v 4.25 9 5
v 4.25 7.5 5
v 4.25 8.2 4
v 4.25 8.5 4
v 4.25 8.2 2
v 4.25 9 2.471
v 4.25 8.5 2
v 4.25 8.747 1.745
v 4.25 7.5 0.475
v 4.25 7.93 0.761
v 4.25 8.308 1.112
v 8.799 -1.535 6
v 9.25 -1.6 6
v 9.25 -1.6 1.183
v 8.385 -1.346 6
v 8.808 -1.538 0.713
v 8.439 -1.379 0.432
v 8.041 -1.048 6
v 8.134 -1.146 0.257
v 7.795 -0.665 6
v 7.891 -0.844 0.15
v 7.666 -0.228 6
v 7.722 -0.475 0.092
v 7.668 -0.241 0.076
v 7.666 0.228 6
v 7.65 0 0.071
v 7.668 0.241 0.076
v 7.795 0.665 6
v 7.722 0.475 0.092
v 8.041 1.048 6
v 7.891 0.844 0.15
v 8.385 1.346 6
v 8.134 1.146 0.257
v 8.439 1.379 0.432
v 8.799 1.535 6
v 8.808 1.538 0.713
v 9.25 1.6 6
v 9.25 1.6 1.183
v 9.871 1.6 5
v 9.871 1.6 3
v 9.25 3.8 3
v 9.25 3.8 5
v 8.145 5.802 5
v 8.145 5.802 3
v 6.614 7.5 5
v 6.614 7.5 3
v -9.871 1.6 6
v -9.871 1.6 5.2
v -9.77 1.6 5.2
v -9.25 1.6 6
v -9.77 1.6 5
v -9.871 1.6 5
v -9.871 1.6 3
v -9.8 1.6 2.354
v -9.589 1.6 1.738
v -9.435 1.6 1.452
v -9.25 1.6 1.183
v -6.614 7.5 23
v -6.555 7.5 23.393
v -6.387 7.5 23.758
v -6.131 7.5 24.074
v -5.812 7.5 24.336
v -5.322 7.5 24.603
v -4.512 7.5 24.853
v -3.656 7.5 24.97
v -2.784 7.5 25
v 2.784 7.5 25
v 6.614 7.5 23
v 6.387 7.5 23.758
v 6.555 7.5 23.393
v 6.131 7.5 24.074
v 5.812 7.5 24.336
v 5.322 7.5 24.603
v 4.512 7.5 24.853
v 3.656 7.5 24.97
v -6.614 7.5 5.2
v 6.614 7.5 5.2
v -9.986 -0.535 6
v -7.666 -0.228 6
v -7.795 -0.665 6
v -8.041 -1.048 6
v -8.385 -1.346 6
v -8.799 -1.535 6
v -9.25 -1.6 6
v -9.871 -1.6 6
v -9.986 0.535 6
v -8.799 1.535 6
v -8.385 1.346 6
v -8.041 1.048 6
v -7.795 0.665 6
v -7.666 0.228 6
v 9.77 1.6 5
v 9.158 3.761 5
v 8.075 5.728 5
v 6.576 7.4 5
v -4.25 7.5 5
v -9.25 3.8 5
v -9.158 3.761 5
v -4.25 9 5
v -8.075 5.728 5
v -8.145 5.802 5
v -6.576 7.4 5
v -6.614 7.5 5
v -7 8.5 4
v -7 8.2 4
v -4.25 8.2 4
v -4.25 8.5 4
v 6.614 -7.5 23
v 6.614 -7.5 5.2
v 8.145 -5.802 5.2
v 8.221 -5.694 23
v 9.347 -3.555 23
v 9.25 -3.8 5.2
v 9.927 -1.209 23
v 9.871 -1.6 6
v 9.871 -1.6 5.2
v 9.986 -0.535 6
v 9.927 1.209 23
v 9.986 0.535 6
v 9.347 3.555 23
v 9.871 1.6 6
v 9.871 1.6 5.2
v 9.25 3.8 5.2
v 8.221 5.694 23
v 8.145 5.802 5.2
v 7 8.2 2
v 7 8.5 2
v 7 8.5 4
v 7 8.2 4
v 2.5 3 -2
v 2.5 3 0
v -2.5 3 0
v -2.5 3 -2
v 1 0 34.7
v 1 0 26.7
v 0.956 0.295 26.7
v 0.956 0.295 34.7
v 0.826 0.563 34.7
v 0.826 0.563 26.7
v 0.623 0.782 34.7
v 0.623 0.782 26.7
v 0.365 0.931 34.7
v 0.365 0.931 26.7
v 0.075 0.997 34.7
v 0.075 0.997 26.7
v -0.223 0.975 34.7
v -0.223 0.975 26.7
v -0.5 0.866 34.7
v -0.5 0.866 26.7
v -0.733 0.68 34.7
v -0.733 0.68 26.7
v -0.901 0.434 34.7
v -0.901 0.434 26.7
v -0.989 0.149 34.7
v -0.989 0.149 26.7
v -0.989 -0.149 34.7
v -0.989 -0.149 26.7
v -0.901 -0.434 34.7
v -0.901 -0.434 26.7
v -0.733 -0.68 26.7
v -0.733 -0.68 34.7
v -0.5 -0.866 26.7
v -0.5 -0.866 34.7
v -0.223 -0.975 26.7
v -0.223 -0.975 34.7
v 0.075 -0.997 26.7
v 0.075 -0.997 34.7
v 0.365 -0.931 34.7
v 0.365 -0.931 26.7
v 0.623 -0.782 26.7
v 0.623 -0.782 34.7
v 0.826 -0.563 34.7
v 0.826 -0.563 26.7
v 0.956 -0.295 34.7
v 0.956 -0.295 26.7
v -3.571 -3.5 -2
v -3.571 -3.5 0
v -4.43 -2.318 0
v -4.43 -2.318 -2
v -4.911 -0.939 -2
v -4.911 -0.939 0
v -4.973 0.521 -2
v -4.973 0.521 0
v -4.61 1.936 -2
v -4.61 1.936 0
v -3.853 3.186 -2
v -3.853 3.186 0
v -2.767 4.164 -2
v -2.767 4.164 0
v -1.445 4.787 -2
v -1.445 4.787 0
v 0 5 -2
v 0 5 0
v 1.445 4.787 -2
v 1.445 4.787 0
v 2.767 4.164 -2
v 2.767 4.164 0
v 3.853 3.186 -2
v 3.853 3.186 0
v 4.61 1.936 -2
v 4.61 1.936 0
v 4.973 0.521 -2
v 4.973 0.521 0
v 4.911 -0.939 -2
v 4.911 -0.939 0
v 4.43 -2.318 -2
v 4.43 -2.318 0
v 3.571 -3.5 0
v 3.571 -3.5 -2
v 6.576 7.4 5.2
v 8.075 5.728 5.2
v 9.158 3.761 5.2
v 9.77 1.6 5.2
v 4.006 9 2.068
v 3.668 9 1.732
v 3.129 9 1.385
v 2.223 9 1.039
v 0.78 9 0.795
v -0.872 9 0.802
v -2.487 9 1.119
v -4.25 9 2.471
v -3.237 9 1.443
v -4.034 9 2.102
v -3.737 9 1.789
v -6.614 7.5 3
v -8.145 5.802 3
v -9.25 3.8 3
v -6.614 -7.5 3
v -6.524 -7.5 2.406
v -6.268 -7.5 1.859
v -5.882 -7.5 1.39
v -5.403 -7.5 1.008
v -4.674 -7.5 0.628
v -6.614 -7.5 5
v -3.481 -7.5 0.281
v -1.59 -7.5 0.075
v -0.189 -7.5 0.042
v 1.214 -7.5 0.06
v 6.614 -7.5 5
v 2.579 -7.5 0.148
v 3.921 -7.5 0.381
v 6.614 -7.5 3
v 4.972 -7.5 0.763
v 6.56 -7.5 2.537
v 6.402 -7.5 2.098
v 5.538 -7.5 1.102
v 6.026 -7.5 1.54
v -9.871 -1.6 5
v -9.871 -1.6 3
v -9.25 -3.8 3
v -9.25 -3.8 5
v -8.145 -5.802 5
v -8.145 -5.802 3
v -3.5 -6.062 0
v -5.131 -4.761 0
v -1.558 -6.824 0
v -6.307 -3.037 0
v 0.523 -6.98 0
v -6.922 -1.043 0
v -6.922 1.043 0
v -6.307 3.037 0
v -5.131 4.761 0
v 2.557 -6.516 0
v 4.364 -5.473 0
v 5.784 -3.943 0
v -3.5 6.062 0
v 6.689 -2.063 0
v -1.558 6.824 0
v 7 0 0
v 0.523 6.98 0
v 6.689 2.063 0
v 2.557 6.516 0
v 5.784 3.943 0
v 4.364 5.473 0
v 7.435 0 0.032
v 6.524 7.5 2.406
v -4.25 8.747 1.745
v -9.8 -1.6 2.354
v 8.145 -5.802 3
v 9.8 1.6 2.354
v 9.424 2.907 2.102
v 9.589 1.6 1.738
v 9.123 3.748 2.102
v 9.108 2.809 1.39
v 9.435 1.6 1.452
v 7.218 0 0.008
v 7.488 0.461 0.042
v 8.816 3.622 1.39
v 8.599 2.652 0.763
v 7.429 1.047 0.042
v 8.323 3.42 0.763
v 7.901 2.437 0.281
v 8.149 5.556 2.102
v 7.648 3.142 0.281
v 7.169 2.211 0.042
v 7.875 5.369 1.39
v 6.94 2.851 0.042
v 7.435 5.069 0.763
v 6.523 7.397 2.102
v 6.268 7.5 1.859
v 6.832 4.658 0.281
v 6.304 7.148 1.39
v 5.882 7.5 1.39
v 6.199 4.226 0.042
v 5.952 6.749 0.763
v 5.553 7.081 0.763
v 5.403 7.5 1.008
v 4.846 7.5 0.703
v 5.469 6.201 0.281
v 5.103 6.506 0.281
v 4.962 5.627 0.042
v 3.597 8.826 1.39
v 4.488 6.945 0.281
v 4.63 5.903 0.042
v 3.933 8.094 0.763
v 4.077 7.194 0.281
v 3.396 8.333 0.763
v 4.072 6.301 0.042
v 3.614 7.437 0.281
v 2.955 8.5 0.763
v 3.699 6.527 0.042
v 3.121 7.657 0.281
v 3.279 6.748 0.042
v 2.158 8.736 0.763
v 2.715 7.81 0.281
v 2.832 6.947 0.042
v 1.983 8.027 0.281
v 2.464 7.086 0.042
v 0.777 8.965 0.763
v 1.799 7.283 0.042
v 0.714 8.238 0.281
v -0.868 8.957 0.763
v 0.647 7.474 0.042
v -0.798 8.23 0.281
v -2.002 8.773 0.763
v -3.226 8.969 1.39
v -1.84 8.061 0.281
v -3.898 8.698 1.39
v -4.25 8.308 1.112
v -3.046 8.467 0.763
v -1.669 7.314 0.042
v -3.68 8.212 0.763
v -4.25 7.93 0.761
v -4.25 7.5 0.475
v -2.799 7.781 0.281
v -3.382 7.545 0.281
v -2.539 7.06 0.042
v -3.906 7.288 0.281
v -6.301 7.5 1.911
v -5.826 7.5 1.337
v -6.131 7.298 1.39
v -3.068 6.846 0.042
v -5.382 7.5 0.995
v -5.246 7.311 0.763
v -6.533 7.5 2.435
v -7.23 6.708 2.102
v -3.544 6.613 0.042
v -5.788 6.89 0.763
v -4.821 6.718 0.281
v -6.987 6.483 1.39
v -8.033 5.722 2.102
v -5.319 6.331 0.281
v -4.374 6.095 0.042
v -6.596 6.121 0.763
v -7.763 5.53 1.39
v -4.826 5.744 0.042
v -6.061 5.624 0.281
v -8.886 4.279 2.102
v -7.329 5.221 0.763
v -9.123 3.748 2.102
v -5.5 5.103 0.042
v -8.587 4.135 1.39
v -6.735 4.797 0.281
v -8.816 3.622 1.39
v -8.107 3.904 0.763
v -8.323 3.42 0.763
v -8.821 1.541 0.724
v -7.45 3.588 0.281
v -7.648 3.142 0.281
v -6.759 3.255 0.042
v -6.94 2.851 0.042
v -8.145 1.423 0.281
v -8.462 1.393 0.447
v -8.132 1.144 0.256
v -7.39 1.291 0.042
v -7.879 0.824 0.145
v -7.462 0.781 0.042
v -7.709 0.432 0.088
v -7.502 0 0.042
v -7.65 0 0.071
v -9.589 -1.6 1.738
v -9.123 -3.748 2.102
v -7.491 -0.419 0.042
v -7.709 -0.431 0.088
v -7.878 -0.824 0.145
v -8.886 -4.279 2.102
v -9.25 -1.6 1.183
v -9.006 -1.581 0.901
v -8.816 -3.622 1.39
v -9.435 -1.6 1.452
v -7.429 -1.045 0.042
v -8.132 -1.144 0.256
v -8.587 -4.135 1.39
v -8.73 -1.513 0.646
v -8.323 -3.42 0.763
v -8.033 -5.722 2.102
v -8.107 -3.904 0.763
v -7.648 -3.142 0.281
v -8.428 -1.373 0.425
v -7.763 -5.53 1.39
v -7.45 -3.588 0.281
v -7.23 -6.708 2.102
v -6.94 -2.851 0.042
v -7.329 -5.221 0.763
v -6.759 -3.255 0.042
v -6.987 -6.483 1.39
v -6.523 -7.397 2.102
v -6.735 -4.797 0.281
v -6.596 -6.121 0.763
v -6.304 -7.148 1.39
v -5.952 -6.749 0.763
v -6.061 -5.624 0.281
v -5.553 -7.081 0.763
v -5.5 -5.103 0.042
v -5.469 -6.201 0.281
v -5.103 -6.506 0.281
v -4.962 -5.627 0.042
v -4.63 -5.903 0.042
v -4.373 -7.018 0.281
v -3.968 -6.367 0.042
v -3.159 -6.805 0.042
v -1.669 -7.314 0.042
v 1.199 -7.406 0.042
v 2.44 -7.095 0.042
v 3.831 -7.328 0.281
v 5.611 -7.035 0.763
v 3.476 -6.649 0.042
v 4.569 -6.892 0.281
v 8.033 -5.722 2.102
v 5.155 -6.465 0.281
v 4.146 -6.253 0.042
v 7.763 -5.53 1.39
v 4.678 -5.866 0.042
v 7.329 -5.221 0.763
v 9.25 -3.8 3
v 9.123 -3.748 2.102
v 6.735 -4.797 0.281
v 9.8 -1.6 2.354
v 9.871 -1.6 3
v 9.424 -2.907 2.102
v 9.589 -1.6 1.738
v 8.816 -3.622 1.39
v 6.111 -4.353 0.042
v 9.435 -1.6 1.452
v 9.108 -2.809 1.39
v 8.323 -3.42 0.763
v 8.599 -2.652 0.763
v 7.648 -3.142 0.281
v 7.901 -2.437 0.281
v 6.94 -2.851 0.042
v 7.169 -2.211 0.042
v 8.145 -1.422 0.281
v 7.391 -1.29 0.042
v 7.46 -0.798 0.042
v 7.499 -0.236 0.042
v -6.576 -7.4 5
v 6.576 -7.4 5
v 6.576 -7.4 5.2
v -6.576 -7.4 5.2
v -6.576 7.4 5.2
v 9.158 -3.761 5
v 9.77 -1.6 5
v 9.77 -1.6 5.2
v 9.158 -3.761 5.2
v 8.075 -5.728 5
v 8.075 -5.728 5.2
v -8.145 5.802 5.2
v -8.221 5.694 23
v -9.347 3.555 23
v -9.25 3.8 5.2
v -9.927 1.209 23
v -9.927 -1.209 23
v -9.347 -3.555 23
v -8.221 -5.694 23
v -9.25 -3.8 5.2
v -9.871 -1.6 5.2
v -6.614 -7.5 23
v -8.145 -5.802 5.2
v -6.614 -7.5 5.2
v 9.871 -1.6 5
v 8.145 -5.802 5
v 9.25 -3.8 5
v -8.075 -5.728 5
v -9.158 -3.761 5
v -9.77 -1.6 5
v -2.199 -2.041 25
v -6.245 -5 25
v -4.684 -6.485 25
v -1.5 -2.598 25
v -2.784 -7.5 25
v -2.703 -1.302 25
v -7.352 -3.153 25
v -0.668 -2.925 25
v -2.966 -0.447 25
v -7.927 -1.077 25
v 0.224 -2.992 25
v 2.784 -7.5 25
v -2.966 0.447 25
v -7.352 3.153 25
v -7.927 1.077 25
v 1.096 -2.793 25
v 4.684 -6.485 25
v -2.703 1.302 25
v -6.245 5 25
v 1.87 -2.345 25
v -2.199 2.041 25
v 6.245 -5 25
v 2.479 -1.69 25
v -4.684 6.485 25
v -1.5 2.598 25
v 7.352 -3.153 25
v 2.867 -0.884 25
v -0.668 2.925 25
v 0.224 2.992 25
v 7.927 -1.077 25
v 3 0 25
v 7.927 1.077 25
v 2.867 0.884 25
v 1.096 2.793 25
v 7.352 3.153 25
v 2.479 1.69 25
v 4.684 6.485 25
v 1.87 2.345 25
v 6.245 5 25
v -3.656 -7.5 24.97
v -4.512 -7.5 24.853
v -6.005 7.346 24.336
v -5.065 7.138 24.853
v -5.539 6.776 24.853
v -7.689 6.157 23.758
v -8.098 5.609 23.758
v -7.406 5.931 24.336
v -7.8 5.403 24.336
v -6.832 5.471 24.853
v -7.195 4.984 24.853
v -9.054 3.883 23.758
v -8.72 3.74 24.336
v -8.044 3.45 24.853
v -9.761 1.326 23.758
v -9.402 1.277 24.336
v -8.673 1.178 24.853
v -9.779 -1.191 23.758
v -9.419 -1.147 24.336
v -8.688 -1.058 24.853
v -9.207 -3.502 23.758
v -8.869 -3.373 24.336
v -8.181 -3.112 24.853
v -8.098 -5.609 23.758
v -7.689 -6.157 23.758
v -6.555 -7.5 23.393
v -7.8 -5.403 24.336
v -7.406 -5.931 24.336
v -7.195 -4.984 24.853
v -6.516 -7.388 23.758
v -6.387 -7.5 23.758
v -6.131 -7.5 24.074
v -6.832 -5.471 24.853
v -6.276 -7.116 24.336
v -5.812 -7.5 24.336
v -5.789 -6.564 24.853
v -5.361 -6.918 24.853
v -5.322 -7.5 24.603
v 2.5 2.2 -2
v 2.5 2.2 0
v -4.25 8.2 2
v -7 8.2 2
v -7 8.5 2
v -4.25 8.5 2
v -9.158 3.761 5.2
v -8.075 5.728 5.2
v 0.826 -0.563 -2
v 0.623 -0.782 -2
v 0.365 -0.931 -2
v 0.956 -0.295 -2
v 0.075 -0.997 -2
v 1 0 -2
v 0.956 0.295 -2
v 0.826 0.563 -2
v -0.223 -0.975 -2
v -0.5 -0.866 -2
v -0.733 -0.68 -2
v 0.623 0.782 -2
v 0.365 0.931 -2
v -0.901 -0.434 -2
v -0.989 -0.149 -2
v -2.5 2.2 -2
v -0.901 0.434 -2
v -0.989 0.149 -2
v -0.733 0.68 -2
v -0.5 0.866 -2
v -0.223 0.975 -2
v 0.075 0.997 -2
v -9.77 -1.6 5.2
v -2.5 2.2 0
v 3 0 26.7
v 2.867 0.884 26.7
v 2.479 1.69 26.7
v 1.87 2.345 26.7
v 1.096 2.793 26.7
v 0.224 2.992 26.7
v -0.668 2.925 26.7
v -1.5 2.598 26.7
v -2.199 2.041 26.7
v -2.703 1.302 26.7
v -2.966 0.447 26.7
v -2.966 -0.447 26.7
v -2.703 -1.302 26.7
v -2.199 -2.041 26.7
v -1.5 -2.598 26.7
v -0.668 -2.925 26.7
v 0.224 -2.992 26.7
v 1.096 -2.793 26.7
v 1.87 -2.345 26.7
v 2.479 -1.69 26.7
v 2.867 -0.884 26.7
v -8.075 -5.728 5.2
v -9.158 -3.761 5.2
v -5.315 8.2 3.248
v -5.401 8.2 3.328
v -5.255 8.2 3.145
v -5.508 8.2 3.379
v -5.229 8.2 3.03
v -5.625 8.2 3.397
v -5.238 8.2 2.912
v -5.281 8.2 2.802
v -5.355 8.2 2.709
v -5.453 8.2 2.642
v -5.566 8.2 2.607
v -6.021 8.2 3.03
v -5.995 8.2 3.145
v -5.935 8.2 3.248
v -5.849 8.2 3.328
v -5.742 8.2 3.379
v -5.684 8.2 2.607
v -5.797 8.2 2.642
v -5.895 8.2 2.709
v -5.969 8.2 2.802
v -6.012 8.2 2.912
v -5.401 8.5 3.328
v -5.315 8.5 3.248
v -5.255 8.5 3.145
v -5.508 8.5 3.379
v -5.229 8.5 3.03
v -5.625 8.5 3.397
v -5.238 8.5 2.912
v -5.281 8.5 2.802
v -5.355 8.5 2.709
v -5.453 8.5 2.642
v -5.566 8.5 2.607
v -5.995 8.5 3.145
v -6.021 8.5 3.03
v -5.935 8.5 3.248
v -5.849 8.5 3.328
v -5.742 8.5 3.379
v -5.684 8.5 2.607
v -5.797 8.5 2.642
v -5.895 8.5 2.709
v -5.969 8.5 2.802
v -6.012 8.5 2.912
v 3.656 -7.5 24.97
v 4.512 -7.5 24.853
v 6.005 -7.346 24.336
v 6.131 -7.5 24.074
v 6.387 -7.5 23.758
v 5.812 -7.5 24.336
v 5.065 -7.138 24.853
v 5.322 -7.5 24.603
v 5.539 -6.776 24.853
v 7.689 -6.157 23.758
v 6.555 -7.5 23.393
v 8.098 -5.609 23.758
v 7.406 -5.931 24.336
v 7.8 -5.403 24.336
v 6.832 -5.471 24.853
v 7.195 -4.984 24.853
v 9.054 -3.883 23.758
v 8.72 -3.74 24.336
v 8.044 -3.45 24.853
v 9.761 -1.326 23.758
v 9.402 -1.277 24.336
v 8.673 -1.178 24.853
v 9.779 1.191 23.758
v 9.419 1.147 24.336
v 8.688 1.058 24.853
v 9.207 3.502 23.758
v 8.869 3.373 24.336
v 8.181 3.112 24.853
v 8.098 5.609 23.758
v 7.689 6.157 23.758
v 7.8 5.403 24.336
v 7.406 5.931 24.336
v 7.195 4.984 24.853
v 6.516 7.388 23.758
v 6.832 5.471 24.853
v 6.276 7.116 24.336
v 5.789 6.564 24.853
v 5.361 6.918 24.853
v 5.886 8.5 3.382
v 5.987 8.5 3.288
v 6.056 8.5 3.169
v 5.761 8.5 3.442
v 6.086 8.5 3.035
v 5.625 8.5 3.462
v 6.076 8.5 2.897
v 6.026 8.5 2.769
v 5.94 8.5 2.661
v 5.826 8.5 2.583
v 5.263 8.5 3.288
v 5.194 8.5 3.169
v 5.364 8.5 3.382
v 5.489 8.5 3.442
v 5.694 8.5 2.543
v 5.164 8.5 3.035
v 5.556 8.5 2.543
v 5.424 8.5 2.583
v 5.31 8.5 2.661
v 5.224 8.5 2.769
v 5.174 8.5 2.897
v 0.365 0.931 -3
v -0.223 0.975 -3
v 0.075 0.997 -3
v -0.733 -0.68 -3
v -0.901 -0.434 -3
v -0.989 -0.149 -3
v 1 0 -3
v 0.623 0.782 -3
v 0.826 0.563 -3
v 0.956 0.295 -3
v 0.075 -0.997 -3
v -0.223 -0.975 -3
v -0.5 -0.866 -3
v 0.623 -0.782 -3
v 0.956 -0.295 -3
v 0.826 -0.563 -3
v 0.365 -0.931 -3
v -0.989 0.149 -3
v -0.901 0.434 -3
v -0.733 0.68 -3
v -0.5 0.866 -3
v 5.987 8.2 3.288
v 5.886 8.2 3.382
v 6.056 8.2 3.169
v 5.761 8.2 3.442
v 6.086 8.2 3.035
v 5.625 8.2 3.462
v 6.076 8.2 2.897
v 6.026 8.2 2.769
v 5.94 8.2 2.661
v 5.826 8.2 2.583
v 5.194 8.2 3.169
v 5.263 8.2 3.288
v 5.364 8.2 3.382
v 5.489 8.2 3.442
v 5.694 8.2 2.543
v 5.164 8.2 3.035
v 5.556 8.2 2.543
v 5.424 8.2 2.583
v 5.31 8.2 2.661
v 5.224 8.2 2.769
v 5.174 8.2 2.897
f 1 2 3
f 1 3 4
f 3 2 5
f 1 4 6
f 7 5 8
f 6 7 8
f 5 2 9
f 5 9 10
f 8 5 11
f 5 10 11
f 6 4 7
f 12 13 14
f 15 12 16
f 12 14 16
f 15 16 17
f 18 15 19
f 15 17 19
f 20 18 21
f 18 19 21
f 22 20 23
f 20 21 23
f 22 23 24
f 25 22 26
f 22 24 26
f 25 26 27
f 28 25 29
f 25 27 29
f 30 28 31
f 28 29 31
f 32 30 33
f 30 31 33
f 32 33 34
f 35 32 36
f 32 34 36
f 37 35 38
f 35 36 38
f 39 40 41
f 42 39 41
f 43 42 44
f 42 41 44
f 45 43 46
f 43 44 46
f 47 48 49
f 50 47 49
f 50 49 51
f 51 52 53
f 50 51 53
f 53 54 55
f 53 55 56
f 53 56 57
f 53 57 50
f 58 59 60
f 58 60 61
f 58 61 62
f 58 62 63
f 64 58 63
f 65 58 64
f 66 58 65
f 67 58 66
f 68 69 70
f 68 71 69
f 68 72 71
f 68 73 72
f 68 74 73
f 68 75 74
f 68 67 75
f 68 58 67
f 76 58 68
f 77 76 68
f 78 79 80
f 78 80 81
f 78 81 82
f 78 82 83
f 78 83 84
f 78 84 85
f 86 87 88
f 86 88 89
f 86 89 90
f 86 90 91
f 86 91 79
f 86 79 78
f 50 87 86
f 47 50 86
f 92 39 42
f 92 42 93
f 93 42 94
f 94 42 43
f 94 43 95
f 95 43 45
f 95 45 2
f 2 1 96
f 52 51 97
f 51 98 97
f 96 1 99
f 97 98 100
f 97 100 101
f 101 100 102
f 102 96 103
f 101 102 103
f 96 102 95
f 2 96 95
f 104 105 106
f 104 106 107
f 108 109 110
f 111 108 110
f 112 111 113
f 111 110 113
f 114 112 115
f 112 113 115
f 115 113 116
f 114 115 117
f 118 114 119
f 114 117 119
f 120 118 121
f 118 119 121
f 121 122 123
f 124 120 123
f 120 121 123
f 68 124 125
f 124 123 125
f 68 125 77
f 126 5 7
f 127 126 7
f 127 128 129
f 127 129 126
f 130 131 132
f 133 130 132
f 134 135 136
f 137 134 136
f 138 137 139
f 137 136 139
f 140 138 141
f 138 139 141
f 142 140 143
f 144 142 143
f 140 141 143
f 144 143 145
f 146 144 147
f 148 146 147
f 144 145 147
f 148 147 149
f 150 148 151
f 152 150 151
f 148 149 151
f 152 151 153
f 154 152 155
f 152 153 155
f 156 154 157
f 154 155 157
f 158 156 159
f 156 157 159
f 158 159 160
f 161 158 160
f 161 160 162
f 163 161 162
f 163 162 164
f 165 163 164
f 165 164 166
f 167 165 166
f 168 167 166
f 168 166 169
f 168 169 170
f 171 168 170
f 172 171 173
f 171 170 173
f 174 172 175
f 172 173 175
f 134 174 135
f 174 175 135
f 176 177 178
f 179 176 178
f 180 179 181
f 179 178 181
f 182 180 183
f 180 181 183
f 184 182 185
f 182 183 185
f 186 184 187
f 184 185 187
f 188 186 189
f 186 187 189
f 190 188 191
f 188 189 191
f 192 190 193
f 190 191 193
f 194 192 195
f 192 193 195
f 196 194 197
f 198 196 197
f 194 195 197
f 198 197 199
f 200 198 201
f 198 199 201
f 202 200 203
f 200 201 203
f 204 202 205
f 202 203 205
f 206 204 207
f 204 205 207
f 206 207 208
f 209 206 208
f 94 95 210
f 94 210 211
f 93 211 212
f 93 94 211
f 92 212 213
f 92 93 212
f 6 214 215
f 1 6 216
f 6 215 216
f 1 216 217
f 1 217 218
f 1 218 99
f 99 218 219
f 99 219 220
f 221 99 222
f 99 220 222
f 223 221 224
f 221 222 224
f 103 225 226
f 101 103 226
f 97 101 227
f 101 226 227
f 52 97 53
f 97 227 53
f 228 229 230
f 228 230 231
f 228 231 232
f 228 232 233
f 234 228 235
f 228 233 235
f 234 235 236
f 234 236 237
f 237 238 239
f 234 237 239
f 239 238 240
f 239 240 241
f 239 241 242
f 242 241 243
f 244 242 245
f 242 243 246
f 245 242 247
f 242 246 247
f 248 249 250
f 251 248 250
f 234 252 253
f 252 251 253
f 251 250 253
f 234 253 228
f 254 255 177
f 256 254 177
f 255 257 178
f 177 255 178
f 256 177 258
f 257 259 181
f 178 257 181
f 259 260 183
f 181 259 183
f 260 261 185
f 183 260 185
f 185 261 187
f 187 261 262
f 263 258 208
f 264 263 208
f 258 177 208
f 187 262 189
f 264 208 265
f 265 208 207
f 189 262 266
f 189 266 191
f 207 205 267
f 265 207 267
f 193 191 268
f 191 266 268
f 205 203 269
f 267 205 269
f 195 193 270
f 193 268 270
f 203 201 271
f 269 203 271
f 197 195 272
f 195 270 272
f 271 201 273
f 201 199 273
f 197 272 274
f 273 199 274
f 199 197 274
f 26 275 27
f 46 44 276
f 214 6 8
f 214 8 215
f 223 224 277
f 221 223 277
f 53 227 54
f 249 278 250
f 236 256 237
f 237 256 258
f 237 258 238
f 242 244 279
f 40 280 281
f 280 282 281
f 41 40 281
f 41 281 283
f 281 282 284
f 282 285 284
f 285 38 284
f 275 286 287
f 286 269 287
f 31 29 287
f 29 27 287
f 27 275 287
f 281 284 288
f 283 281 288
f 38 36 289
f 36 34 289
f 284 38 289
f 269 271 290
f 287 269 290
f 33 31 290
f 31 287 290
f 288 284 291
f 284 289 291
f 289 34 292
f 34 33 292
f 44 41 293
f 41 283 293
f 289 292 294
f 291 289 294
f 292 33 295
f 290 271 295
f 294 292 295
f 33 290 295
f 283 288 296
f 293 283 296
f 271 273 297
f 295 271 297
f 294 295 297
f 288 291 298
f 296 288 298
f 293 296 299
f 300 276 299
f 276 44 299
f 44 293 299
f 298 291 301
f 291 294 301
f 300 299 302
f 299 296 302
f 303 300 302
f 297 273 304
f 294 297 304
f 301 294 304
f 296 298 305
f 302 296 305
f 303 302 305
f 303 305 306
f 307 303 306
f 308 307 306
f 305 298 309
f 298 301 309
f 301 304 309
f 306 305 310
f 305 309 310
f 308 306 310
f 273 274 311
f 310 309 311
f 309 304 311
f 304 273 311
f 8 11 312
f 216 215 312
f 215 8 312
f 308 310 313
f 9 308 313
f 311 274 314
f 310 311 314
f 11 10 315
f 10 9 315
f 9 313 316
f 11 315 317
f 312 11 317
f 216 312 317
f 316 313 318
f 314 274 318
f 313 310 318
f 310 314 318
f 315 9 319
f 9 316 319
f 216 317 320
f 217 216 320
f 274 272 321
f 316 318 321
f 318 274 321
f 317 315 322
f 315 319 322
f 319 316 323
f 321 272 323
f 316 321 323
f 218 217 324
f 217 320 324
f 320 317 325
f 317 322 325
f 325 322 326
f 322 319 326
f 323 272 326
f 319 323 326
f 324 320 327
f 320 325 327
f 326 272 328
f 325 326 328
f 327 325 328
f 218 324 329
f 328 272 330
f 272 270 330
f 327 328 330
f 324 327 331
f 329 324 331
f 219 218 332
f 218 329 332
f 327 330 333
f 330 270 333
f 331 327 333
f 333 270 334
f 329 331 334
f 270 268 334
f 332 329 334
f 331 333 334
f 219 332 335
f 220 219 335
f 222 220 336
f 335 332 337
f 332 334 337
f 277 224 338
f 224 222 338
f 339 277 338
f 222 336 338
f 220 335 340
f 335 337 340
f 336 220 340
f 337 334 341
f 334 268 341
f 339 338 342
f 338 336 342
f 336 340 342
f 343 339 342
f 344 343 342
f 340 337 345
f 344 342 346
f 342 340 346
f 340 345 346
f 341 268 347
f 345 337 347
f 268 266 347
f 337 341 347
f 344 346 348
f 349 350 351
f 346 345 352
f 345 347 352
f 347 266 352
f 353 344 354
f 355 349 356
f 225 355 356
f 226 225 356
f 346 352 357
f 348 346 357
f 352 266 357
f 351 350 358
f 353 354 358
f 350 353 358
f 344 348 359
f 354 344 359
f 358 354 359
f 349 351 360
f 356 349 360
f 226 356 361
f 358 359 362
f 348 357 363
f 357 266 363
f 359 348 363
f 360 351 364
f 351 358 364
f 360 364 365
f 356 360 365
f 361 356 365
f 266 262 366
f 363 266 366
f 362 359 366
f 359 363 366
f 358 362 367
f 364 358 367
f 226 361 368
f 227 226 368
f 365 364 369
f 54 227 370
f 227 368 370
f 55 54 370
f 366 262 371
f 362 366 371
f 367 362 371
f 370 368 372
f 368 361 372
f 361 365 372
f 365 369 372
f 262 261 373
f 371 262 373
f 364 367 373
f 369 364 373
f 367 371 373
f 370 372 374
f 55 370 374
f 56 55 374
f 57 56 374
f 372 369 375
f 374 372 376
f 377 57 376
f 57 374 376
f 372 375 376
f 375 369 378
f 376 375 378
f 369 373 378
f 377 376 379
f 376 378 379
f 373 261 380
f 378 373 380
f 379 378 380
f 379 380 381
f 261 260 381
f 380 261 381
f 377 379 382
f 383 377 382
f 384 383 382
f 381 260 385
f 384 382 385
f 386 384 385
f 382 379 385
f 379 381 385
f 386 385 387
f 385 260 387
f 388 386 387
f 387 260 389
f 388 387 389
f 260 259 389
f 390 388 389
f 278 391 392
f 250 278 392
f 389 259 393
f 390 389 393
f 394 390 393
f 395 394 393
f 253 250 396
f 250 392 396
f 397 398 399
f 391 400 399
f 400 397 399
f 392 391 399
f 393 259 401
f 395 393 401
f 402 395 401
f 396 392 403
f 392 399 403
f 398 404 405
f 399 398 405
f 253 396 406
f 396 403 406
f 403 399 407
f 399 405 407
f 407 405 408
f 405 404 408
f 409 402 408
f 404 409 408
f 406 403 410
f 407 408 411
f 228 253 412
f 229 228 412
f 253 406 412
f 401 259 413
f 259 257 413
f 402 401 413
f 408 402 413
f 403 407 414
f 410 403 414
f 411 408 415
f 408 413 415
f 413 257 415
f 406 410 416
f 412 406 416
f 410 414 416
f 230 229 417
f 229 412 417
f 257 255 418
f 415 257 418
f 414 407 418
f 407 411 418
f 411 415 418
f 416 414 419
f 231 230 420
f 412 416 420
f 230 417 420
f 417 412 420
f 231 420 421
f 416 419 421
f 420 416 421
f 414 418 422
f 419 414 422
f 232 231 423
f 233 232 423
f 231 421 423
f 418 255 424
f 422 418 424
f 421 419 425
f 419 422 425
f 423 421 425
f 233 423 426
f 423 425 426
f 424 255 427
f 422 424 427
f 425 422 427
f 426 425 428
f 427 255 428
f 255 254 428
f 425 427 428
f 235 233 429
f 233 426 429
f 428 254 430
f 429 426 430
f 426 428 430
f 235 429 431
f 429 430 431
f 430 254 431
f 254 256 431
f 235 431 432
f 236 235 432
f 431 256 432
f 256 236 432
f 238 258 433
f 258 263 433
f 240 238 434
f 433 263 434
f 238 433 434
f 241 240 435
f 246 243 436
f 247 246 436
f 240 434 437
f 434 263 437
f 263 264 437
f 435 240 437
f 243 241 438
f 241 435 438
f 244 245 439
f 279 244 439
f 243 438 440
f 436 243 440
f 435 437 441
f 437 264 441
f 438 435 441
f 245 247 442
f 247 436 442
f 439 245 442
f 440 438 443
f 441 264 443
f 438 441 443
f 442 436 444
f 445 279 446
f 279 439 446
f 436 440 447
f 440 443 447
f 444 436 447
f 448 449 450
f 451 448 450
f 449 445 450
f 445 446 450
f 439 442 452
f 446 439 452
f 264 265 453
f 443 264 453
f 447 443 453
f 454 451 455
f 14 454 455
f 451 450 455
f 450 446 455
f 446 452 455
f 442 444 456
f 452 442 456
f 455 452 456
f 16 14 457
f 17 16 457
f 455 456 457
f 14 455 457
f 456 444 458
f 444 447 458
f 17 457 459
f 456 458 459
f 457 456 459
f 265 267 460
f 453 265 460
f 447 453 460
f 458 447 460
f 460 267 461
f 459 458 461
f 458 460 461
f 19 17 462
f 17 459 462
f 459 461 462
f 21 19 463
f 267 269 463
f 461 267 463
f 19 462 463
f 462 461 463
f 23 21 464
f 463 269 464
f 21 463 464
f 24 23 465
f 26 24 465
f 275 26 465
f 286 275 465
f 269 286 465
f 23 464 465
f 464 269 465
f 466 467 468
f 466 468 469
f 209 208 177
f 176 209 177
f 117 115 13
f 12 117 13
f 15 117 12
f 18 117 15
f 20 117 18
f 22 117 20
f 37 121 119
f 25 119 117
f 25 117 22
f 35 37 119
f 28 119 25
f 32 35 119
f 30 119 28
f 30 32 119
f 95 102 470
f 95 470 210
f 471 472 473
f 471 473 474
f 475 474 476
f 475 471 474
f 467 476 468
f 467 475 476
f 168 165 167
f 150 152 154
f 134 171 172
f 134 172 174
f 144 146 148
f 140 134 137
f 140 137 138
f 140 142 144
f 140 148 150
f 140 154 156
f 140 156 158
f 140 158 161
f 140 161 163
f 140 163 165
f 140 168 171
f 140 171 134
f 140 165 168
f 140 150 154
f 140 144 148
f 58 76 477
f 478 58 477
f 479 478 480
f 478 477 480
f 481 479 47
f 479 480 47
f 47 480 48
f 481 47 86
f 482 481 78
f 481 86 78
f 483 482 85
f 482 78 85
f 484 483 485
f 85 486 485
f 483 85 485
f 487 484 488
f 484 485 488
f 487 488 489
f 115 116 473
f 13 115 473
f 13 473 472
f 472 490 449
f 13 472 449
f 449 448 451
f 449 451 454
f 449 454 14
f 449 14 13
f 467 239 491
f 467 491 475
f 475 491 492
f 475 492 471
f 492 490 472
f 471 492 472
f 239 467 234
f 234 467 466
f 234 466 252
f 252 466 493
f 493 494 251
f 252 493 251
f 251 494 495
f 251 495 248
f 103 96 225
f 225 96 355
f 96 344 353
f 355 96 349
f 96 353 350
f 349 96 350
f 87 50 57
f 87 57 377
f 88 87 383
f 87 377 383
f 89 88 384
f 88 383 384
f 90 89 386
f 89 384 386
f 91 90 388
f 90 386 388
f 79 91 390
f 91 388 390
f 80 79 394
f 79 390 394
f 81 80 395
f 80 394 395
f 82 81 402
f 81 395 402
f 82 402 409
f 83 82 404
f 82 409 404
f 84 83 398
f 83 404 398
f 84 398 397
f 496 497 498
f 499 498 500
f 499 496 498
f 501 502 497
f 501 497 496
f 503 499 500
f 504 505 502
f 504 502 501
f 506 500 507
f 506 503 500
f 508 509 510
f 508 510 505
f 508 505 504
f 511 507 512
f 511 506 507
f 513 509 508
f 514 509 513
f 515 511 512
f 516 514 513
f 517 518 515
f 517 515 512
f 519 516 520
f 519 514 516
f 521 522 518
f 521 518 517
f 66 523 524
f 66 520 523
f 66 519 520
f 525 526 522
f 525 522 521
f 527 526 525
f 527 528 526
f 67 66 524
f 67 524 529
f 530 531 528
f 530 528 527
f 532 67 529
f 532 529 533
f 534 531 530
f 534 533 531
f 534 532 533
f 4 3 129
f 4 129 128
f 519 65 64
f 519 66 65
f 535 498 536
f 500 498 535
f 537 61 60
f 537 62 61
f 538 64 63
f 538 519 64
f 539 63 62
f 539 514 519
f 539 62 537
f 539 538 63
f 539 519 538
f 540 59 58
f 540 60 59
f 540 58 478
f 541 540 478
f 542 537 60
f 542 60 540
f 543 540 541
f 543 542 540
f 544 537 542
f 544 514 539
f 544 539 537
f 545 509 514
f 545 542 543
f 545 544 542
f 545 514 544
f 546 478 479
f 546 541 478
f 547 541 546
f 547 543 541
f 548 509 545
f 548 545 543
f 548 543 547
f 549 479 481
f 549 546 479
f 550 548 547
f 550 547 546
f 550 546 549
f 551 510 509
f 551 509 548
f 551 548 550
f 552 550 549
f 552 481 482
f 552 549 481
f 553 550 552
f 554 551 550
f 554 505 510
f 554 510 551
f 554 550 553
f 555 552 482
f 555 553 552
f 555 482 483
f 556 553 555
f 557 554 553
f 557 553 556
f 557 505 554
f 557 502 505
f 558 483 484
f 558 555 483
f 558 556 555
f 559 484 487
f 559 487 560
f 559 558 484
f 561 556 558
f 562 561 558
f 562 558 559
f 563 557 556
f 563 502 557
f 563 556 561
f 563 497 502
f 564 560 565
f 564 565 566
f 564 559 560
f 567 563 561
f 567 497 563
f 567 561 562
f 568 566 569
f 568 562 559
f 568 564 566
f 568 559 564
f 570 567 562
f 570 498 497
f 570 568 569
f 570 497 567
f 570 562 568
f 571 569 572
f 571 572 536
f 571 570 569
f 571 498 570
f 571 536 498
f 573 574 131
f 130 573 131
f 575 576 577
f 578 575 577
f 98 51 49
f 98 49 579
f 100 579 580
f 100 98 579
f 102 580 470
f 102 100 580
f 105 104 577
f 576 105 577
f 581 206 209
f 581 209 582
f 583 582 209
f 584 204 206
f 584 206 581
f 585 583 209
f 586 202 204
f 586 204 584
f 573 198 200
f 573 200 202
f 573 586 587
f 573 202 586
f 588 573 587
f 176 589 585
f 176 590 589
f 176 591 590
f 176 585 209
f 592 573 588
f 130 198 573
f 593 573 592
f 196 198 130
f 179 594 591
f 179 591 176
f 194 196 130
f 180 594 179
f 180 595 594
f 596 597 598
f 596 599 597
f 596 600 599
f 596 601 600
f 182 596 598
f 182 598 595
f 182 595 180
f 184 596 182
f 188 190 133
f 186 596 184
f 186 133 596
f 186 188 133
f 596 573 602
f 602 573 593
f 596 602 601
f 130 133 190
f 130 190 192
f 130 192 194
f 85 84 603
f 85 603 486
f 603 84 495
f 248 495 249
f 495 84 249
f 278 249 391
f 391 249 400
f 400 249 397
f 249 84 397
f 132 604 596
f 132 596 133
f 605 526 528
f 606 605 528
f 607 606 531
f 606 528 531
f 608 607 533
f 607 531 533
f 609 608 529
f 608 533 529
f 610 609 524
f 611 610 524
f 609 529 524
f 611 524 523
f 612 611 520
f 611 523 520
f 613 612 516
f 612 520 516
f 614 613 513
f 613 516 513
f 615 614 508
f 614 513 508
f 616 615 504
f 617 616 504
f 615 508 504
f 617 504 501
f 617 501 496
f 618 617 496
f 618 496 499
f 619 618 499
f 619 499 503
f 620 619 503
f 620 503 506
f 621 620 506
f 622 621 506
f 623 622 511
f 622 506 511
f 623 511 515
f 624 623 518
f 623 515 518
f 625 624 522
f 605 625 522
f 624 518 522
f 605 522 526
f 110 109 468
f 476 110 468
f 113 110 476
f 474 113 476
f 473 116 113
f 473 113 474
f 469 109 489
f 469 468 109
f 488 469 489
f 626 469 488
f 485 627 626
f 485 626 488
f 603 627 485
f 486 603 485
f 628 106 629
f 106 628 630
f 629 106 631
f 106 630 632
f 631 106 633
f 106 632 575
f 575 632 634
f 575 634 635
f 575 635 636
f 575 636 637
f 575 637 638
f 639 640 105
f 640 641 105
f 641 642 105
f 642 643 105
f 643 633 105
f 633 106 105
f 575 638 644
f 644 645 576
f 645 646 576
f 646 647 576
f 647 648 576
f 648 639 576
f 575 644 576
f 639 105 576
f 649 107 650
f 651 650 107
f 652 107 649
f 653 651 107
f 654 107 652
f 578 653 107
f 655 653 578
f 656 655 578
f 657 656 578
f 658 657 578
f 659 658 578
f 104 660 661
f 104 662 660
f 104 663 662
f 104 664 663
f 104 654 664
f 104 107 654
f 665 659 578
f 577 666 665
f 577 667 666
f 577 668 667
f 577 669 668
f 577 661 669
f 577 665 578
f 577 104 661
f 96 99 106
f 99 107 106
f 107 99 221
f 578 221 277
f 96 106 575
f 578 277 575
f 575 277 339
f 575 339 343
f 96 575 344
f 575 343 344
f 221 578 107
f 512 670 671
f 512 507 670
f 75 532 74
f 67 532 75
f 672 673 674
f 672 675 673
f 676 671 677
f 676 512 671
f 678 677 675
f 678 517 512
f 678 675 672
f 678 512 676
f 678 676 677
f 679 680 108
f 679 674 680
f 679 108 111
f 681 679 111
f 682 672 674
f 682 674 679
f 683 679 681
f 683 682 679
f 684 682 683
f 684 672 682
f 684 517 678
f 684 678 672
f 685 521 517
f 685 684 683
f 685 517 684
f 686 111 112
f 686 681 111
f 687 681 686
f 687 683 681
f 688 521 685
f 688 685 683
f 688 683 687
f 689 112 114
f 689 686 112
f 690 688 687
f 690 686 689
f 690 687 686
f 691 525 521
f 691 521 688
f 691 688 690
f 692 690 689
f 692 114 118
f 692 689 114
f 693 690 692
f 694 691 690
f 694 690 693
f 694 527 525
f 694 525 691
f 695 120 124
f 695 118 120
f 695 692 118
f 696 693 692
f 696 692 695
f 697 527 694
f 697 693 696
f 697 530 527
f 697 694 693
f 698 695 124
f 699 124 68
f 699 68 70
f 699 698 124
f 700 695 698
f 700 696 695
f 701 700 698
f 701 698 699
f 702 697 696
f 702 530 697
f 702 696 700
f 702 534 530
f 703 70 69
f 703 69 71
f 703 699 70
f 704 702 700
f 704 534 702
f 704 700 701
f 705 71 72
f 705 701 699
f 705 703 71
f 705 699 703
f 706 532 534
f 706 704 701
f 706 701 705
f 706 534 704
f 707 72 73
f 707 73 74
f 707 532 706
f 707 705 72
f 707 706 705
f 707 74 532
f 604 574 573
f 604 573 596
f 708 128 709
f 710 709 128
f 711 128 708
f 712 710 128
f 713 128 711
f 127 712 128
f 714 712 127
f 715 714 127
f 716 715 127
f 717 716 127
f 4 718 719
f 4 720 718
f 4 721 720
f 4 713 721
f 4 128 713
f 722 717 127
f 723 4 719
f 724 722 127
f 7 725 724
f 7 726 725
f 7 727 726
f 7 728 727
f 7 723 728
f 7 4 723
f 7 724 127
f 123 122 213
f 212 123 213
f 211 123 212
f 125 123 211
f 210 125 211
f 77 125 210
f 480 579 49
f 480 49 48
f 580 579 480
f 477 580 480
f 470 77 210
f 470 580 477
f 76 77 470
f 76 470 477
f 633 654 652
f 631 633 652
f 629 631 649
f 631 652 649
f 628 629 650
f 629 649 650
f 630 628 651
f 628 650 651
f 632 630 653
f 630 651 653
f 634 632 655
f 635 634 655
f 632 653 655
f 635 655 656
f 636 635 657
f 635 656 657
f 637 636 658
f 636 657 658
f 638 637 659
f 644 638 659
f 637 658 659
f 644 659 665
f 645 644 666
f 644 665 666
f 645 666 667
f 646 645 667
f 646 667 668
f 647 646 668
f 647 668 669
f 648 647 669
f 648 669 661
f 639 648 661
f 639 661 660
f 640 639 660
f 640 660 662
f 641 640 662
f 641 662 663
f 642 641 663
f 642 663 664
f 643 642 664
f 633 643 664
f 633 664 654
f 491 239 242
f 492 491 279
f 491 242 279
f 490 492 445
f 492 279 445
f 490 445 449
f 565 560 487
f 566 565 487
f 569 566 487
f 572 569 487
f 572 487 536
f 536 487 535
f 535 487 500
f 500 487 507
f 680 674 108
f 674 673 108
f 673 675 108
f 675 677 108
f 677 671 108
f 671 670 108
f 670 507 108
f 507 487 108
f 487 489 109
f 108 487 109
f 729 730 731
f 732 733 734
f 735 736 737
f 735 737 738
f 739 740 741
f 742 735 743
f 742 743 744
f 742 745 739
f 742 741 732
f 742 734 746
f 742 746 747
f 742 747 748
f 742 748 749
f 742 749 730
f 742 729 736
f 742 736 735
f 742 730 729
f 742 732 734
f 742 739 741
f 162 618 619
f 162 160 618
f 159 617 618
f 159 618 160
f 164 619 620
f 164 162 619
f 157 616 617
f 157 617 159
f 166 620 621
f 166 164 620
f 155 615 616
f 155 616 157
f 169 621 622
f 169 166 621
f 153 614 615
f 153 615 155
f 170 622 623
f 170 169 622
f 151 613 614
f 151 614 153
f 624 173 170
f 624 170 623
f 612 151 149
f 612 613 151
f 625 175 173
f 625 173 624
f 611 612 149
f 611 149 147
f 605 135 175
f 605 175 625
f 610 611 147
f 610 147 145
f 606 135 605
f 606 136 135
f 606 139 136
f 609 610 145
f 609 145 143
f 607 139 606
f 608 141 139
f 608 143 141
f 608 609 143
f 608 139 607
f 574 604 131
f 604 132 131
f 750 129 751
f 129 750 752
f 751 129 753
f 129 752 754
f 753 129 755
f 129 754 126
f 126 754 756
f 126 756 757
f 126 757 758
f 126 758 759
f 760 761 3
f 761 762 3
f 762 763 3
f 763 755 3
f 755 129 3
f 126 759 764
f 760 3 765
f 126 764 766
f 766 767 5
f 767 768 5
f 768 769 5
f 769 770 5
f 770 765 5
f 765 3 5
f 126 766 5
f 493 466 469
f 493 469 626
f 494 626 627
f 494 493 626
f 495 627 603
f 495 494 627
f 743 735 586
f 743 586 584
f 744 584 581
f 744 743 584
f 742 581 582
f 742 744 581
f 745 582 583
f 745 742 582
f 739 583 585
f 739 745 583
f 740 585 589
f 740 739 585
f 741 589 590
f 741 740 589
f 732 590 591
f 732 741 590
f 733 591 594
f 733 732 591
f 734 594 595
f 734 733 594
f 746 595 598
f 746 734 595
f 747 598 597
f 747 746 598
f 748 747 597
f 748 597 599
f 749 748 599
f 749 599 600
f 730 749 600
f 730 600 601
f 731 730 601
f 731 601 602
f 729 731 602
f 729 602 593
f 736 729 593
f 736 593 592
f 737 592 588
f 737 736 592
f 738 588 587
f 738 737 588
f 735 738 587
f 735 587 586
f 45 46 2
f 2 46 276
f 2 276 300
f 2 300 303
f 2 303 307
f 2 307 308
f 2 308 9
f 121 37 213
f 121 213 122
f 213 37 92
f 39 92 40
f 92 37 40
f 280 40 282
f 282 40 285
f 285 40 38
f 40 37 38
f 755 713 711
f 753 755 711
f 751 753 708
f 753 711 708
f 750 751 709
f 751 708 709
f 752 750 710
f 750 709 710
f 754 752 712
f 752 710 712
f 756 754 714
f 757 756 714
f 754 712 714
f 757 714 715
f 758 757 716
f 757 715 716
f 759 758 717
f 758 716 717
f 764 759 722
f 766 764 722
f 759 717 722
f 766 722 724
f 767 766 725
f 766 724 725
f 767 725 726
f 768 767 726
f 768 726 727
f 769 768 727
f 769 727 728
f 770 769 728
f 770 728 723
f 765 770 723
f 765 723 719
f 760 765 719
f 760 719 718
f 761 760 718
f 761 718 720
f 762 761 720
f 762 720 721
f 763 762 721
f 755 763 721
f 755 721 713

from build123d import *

# Parameters (mm, degrees)
SKETCH_1_R            = 10
EXTRUDE_1_DEPTH       = 25
CUT_EXTRUDE_START     = 5
SKETCH_2_W            = 45.854835026
SKETCH_2_H            = 35
SKETCH_2_W_2          = 25.854835026
SKETCH_2_H_2          = 15
CUT_EXTRUDE_2_DEPTH   = 25
SKETCH_3_R            = 3
EXTRUDE_2_DEPTH       = 1.7
SKETCH_4_R            = 1
EXTRUDE_3_DEPTH       = 8
FILLET_1_R            = 2
FILLET_2_R            = 3
SKETCH_5_W            = 5
SKETCH_5_H            = 0.8
EXTRUDE_4_DEPTH       = 2
EXTRUDE_START         = 1
SKETCH_6_R            = 1
EXTRUDE_5_DEPTH       = 1
CUT_EXTRUDE_1_DEPTH   = 6
CUT_EXTRUDE_3_DEPTH   = 0.2
SKETCH_9_W            = 22.189526506
SKETCH_9_H            = 4.332571278
CUT_EXTRUDE_2_2_DEPTH = 5
EXTRUDE_7_DEPTH       = 7
EXTRUDE_7_DEPTH_BACK  = 7
SKETCH_11_W           = 2
SKETCH_11_H           = 0.3
CUT_EXTRUDE_3_2_REACH = 41.498
SKETCH_12_R           = 0.462491299
SKETCH_12_R_2         = 0.396984266


with BuildPart() as part:
    # Эскиз1 → Бобышка-Вытянуть1 (new body)
    with BuildSketch(Plane.XY):
        Circle(SKETCH_1_R)
    extrude(amount=EXTRUDE_1_DEPTH)

    # Эскиз2 → Cut-Extrude 2 (cut)
    with BuildSketch(Plane.XY.offset(CUT_EXTRUDE_START)):
        Rectangle(SKETCH_2_W, SKETCH_2_H)
        Rectangle(SKETCH_2_W_2, SKETCH_2_H_2, mode=Mode.SUBTRACT)
    extrude(amount=CUT_EXTRUDE_2_DEPTH, mode=Mode.SUBTRACT)

    # Эскиз3 → Бобышка-Вытянуть2 (add)
    with BuildSketch(Plane.XY.offset(25)):
        Circle(SKETCH_3_R)
    extrude(amount=EXTRUDE_2_DEPTH)

    # Эскиз4 → Бобышка-Вытянуть3 (add)
    with BuildSketch(Plane.XY.offset(26.7)):
        Circle(SKETCH_4_R)
    extrude(amount=EXTRUDE_3_DEPTH)

    # Скругление1
    fillet_1_edges = [part.edges().sort_by_distance(p)[0] for p in [
        (-10, 0, 25),
        (9.114378278, 4.114378278, 25),
    ]]
    fillet(fillet_1_edges, radius=FILLET_1_R)

    # Скругление2
    fillet_2_edges = [part.edges().sort_by_distance(p)[0] for p in [
        (-10, 0, 0),
    ]]
    fillet(fillet_2_edges, radius=FILLET_2_R)

    # Эскиз5 → Бобышка-Вытянуть4 (add)
    with BuildSketch(Plane(origin=(0, 0, 0), x_dir=(-1, 0, 0), z_dir=(0, 0, -1))):
        with BuildLine():
            Line((-3.570714214, -3.5), (3.570714214, -3.5))
            ThreePointArc((3.570714214, -3.5), (0, 5), (-3.570714214, -3.5))
        make_face()
        with Locations((0, 2.6)):
            Rectangle(SKETCH_5_W, SKETCH_5_H, mode=Mode.SUBTRACT)
    extrude(amount=EXTRUDE_4_DEPTH)

    # Эскиз6 → Бобышка-Вытянуть5 (add)
    with BuildSketch(Plane(origin=(0, 0, -2), x_dir=(-1, 0, 0), z_dir=(0, 0, -1)).offset(EXTRUDE_START)):
        with Locations(Location((0, 0, 0), (0, 0, 180))):
            Circle(SKETCH_6_R)
    extrude(amount=-EXTRUDE_5_DEPTH)

    # Эскиз7 → Вырез-Вытянуть1 (cut)
    with BuildSketch(Plane.XY):
        with BuildLine():
            Line((9.25, 1.6), (12.510793403, 1.6))
            ThreePointArc((12.510793403, 1.6), (14.110793403, 0), (12.510793403, -1.6))
            Line((12.510793403, -1.6), (9.25, -1.6))
            ThreePointArc((9.25, -1.6), (7.65, 0), (9.25, 1.6))
        make_face()
        with BuildLine():
            Line((-9.25, -1.6), (-13.171375323, -1.6))
            ThreePointArc((-13.171375323, -1.6), (-14.771375323, 0), (-13.171375323, 1.6))
            Line((-13.171375323, 1.6), (-9.25, 1.6))
            ThreePointArc((-9.25, 1.6), (-7.65, 0), (-9.25, -1.6))
        make_face()
    extrude(amount=CUT_EXTRUDE_1_DEPTH, mode=Mode.SUBTRACT)

    # Эскиз8 → Cut-Extrude 3 (cut)
    with BuildSketch(Plane.XY.offset(CUT_EXTRUDE_START)):
        with BuildLine():
            Line((6.652067348, -7.6), (-6.652067348, -7.6))
            ThreePointArc((-6.652067348, -7.6), (-10.1, 0), (-6.652067348, 7.6))
            Line((-6.652067348, 7.6), (6.652067348, 7.6))
            ThreePointArc((6.652067348, 7.6), (10.1, 0), (6.652067348, -7.6))
        make_face()
        with BuildLine():
            Line((6.576473219, -7.4), (-6.576473219, -7.4))
            ThreePointArc((-6.576473219, -7.4), (-9.9, 0), (-6.576473219, 7.4))
            Line((-6.576473219, 7.4), (6.576473219, 7.4))
            ThreePointArc((6.576473219, 7.4), (9.9, 0), (6.576473219, -7.4))
        make_face(mode=Mode.SUBTRACT)
    extrude(amount=CUT_EXTRUDE_3_DEPTH, mode=Mode.SUBTRACT)

    # Эскиз9 → Cut-Extrude 2 2 (cut)
    with BuildSketch(Plane.XY):
        with Locations((0.299905464, -9.666285639)):
            Rectangle(SKETCH_9_W, SKETCH_9_H)
        Polygon((4.25, 9), (-4.25, 9), (-4.25, 7.5), (-7.501825295, 7.5), (-7.501825295, 11.857816674), (7.720330833, 11.857816674), (7.720330833, 7.5), (4.25, 7.5), align=None)
    extrude(amount=CUT_EXTRUDE_2_2_DEPTH, mode=Mode.SUBTRACT)

    # Эскиз11 → Бобышка-Вытянуть7 (add, two sides: drawn at the far end of the back side and taken through both)
    with BuildSketch(Plane(origin=(0, 0, 0), x_dir=(0, 0, -1), z_dir=(1, 0, 0)).offset(-EXTRUDE_7_DEPTH_BACK)):
        with Locations((-3, 8.35)):
            Rectangle(SKETCH_11_W, SKETCH_11_H)
    extrude(amount=EXTRUDE_7_DEPTH + EXTRUDE_7_DEPTH_BACK)

    # Эскиз12 → Cut-Extrude 3 2 (cut, up to next)
    with BuildSketch(Plane(origin=(0, 8.5, 0), x_dir=(1, 0, 0), z_dir=(0, 1, 0)), mode=Mode.PRIVATE) as cut_extrude_3_2_sk1:
        with Locations(Location((5.625, -3, 0), (0, 0, 270))):
            Circle(SKETCH_12_R)
    cut_extrude_3_2_tool1 = extrude(cut_extrude_3_2_sk1.sketch, amount=-CUT_EXTRUDE_3_2_REACH, mode=Mode.PRIVATE) & part.part
    # Эскиз12 → Cut-Extrude 3 2 (cut, up to next)
    with BuildSketch(Plane(origin=(0, 8.5, 0), x_dir=(1, 0, 0), z_dir=(0, 1, 0)), mode=Mode.PRIVATE) as cut_extrude_3_2_sk2:
        with Locations(Location((-5.625, -3, 0), (0, 0, 270))):
            Circle(SKETCH_12_R_2)
    cut_extrude_3_2_tool2 = extrude(cut_extrude_3_2_sk2.sketch, amount=-CUT_EXTRUDE_3_2_REACH, mode=Mode.PRIVATE) & part.part
    add(cut_extrude_3_2_tool1.solids().sort_by_distance((5.625, 8.5, 3))[0], mode=Mode.SUBTRACT)
    add(cut_extrude_3_2_tool2.solids().sort_by_distance((-5.625, 8.5, 3))[0], mode=Mode.SUBTRACT)


solid = part.part
